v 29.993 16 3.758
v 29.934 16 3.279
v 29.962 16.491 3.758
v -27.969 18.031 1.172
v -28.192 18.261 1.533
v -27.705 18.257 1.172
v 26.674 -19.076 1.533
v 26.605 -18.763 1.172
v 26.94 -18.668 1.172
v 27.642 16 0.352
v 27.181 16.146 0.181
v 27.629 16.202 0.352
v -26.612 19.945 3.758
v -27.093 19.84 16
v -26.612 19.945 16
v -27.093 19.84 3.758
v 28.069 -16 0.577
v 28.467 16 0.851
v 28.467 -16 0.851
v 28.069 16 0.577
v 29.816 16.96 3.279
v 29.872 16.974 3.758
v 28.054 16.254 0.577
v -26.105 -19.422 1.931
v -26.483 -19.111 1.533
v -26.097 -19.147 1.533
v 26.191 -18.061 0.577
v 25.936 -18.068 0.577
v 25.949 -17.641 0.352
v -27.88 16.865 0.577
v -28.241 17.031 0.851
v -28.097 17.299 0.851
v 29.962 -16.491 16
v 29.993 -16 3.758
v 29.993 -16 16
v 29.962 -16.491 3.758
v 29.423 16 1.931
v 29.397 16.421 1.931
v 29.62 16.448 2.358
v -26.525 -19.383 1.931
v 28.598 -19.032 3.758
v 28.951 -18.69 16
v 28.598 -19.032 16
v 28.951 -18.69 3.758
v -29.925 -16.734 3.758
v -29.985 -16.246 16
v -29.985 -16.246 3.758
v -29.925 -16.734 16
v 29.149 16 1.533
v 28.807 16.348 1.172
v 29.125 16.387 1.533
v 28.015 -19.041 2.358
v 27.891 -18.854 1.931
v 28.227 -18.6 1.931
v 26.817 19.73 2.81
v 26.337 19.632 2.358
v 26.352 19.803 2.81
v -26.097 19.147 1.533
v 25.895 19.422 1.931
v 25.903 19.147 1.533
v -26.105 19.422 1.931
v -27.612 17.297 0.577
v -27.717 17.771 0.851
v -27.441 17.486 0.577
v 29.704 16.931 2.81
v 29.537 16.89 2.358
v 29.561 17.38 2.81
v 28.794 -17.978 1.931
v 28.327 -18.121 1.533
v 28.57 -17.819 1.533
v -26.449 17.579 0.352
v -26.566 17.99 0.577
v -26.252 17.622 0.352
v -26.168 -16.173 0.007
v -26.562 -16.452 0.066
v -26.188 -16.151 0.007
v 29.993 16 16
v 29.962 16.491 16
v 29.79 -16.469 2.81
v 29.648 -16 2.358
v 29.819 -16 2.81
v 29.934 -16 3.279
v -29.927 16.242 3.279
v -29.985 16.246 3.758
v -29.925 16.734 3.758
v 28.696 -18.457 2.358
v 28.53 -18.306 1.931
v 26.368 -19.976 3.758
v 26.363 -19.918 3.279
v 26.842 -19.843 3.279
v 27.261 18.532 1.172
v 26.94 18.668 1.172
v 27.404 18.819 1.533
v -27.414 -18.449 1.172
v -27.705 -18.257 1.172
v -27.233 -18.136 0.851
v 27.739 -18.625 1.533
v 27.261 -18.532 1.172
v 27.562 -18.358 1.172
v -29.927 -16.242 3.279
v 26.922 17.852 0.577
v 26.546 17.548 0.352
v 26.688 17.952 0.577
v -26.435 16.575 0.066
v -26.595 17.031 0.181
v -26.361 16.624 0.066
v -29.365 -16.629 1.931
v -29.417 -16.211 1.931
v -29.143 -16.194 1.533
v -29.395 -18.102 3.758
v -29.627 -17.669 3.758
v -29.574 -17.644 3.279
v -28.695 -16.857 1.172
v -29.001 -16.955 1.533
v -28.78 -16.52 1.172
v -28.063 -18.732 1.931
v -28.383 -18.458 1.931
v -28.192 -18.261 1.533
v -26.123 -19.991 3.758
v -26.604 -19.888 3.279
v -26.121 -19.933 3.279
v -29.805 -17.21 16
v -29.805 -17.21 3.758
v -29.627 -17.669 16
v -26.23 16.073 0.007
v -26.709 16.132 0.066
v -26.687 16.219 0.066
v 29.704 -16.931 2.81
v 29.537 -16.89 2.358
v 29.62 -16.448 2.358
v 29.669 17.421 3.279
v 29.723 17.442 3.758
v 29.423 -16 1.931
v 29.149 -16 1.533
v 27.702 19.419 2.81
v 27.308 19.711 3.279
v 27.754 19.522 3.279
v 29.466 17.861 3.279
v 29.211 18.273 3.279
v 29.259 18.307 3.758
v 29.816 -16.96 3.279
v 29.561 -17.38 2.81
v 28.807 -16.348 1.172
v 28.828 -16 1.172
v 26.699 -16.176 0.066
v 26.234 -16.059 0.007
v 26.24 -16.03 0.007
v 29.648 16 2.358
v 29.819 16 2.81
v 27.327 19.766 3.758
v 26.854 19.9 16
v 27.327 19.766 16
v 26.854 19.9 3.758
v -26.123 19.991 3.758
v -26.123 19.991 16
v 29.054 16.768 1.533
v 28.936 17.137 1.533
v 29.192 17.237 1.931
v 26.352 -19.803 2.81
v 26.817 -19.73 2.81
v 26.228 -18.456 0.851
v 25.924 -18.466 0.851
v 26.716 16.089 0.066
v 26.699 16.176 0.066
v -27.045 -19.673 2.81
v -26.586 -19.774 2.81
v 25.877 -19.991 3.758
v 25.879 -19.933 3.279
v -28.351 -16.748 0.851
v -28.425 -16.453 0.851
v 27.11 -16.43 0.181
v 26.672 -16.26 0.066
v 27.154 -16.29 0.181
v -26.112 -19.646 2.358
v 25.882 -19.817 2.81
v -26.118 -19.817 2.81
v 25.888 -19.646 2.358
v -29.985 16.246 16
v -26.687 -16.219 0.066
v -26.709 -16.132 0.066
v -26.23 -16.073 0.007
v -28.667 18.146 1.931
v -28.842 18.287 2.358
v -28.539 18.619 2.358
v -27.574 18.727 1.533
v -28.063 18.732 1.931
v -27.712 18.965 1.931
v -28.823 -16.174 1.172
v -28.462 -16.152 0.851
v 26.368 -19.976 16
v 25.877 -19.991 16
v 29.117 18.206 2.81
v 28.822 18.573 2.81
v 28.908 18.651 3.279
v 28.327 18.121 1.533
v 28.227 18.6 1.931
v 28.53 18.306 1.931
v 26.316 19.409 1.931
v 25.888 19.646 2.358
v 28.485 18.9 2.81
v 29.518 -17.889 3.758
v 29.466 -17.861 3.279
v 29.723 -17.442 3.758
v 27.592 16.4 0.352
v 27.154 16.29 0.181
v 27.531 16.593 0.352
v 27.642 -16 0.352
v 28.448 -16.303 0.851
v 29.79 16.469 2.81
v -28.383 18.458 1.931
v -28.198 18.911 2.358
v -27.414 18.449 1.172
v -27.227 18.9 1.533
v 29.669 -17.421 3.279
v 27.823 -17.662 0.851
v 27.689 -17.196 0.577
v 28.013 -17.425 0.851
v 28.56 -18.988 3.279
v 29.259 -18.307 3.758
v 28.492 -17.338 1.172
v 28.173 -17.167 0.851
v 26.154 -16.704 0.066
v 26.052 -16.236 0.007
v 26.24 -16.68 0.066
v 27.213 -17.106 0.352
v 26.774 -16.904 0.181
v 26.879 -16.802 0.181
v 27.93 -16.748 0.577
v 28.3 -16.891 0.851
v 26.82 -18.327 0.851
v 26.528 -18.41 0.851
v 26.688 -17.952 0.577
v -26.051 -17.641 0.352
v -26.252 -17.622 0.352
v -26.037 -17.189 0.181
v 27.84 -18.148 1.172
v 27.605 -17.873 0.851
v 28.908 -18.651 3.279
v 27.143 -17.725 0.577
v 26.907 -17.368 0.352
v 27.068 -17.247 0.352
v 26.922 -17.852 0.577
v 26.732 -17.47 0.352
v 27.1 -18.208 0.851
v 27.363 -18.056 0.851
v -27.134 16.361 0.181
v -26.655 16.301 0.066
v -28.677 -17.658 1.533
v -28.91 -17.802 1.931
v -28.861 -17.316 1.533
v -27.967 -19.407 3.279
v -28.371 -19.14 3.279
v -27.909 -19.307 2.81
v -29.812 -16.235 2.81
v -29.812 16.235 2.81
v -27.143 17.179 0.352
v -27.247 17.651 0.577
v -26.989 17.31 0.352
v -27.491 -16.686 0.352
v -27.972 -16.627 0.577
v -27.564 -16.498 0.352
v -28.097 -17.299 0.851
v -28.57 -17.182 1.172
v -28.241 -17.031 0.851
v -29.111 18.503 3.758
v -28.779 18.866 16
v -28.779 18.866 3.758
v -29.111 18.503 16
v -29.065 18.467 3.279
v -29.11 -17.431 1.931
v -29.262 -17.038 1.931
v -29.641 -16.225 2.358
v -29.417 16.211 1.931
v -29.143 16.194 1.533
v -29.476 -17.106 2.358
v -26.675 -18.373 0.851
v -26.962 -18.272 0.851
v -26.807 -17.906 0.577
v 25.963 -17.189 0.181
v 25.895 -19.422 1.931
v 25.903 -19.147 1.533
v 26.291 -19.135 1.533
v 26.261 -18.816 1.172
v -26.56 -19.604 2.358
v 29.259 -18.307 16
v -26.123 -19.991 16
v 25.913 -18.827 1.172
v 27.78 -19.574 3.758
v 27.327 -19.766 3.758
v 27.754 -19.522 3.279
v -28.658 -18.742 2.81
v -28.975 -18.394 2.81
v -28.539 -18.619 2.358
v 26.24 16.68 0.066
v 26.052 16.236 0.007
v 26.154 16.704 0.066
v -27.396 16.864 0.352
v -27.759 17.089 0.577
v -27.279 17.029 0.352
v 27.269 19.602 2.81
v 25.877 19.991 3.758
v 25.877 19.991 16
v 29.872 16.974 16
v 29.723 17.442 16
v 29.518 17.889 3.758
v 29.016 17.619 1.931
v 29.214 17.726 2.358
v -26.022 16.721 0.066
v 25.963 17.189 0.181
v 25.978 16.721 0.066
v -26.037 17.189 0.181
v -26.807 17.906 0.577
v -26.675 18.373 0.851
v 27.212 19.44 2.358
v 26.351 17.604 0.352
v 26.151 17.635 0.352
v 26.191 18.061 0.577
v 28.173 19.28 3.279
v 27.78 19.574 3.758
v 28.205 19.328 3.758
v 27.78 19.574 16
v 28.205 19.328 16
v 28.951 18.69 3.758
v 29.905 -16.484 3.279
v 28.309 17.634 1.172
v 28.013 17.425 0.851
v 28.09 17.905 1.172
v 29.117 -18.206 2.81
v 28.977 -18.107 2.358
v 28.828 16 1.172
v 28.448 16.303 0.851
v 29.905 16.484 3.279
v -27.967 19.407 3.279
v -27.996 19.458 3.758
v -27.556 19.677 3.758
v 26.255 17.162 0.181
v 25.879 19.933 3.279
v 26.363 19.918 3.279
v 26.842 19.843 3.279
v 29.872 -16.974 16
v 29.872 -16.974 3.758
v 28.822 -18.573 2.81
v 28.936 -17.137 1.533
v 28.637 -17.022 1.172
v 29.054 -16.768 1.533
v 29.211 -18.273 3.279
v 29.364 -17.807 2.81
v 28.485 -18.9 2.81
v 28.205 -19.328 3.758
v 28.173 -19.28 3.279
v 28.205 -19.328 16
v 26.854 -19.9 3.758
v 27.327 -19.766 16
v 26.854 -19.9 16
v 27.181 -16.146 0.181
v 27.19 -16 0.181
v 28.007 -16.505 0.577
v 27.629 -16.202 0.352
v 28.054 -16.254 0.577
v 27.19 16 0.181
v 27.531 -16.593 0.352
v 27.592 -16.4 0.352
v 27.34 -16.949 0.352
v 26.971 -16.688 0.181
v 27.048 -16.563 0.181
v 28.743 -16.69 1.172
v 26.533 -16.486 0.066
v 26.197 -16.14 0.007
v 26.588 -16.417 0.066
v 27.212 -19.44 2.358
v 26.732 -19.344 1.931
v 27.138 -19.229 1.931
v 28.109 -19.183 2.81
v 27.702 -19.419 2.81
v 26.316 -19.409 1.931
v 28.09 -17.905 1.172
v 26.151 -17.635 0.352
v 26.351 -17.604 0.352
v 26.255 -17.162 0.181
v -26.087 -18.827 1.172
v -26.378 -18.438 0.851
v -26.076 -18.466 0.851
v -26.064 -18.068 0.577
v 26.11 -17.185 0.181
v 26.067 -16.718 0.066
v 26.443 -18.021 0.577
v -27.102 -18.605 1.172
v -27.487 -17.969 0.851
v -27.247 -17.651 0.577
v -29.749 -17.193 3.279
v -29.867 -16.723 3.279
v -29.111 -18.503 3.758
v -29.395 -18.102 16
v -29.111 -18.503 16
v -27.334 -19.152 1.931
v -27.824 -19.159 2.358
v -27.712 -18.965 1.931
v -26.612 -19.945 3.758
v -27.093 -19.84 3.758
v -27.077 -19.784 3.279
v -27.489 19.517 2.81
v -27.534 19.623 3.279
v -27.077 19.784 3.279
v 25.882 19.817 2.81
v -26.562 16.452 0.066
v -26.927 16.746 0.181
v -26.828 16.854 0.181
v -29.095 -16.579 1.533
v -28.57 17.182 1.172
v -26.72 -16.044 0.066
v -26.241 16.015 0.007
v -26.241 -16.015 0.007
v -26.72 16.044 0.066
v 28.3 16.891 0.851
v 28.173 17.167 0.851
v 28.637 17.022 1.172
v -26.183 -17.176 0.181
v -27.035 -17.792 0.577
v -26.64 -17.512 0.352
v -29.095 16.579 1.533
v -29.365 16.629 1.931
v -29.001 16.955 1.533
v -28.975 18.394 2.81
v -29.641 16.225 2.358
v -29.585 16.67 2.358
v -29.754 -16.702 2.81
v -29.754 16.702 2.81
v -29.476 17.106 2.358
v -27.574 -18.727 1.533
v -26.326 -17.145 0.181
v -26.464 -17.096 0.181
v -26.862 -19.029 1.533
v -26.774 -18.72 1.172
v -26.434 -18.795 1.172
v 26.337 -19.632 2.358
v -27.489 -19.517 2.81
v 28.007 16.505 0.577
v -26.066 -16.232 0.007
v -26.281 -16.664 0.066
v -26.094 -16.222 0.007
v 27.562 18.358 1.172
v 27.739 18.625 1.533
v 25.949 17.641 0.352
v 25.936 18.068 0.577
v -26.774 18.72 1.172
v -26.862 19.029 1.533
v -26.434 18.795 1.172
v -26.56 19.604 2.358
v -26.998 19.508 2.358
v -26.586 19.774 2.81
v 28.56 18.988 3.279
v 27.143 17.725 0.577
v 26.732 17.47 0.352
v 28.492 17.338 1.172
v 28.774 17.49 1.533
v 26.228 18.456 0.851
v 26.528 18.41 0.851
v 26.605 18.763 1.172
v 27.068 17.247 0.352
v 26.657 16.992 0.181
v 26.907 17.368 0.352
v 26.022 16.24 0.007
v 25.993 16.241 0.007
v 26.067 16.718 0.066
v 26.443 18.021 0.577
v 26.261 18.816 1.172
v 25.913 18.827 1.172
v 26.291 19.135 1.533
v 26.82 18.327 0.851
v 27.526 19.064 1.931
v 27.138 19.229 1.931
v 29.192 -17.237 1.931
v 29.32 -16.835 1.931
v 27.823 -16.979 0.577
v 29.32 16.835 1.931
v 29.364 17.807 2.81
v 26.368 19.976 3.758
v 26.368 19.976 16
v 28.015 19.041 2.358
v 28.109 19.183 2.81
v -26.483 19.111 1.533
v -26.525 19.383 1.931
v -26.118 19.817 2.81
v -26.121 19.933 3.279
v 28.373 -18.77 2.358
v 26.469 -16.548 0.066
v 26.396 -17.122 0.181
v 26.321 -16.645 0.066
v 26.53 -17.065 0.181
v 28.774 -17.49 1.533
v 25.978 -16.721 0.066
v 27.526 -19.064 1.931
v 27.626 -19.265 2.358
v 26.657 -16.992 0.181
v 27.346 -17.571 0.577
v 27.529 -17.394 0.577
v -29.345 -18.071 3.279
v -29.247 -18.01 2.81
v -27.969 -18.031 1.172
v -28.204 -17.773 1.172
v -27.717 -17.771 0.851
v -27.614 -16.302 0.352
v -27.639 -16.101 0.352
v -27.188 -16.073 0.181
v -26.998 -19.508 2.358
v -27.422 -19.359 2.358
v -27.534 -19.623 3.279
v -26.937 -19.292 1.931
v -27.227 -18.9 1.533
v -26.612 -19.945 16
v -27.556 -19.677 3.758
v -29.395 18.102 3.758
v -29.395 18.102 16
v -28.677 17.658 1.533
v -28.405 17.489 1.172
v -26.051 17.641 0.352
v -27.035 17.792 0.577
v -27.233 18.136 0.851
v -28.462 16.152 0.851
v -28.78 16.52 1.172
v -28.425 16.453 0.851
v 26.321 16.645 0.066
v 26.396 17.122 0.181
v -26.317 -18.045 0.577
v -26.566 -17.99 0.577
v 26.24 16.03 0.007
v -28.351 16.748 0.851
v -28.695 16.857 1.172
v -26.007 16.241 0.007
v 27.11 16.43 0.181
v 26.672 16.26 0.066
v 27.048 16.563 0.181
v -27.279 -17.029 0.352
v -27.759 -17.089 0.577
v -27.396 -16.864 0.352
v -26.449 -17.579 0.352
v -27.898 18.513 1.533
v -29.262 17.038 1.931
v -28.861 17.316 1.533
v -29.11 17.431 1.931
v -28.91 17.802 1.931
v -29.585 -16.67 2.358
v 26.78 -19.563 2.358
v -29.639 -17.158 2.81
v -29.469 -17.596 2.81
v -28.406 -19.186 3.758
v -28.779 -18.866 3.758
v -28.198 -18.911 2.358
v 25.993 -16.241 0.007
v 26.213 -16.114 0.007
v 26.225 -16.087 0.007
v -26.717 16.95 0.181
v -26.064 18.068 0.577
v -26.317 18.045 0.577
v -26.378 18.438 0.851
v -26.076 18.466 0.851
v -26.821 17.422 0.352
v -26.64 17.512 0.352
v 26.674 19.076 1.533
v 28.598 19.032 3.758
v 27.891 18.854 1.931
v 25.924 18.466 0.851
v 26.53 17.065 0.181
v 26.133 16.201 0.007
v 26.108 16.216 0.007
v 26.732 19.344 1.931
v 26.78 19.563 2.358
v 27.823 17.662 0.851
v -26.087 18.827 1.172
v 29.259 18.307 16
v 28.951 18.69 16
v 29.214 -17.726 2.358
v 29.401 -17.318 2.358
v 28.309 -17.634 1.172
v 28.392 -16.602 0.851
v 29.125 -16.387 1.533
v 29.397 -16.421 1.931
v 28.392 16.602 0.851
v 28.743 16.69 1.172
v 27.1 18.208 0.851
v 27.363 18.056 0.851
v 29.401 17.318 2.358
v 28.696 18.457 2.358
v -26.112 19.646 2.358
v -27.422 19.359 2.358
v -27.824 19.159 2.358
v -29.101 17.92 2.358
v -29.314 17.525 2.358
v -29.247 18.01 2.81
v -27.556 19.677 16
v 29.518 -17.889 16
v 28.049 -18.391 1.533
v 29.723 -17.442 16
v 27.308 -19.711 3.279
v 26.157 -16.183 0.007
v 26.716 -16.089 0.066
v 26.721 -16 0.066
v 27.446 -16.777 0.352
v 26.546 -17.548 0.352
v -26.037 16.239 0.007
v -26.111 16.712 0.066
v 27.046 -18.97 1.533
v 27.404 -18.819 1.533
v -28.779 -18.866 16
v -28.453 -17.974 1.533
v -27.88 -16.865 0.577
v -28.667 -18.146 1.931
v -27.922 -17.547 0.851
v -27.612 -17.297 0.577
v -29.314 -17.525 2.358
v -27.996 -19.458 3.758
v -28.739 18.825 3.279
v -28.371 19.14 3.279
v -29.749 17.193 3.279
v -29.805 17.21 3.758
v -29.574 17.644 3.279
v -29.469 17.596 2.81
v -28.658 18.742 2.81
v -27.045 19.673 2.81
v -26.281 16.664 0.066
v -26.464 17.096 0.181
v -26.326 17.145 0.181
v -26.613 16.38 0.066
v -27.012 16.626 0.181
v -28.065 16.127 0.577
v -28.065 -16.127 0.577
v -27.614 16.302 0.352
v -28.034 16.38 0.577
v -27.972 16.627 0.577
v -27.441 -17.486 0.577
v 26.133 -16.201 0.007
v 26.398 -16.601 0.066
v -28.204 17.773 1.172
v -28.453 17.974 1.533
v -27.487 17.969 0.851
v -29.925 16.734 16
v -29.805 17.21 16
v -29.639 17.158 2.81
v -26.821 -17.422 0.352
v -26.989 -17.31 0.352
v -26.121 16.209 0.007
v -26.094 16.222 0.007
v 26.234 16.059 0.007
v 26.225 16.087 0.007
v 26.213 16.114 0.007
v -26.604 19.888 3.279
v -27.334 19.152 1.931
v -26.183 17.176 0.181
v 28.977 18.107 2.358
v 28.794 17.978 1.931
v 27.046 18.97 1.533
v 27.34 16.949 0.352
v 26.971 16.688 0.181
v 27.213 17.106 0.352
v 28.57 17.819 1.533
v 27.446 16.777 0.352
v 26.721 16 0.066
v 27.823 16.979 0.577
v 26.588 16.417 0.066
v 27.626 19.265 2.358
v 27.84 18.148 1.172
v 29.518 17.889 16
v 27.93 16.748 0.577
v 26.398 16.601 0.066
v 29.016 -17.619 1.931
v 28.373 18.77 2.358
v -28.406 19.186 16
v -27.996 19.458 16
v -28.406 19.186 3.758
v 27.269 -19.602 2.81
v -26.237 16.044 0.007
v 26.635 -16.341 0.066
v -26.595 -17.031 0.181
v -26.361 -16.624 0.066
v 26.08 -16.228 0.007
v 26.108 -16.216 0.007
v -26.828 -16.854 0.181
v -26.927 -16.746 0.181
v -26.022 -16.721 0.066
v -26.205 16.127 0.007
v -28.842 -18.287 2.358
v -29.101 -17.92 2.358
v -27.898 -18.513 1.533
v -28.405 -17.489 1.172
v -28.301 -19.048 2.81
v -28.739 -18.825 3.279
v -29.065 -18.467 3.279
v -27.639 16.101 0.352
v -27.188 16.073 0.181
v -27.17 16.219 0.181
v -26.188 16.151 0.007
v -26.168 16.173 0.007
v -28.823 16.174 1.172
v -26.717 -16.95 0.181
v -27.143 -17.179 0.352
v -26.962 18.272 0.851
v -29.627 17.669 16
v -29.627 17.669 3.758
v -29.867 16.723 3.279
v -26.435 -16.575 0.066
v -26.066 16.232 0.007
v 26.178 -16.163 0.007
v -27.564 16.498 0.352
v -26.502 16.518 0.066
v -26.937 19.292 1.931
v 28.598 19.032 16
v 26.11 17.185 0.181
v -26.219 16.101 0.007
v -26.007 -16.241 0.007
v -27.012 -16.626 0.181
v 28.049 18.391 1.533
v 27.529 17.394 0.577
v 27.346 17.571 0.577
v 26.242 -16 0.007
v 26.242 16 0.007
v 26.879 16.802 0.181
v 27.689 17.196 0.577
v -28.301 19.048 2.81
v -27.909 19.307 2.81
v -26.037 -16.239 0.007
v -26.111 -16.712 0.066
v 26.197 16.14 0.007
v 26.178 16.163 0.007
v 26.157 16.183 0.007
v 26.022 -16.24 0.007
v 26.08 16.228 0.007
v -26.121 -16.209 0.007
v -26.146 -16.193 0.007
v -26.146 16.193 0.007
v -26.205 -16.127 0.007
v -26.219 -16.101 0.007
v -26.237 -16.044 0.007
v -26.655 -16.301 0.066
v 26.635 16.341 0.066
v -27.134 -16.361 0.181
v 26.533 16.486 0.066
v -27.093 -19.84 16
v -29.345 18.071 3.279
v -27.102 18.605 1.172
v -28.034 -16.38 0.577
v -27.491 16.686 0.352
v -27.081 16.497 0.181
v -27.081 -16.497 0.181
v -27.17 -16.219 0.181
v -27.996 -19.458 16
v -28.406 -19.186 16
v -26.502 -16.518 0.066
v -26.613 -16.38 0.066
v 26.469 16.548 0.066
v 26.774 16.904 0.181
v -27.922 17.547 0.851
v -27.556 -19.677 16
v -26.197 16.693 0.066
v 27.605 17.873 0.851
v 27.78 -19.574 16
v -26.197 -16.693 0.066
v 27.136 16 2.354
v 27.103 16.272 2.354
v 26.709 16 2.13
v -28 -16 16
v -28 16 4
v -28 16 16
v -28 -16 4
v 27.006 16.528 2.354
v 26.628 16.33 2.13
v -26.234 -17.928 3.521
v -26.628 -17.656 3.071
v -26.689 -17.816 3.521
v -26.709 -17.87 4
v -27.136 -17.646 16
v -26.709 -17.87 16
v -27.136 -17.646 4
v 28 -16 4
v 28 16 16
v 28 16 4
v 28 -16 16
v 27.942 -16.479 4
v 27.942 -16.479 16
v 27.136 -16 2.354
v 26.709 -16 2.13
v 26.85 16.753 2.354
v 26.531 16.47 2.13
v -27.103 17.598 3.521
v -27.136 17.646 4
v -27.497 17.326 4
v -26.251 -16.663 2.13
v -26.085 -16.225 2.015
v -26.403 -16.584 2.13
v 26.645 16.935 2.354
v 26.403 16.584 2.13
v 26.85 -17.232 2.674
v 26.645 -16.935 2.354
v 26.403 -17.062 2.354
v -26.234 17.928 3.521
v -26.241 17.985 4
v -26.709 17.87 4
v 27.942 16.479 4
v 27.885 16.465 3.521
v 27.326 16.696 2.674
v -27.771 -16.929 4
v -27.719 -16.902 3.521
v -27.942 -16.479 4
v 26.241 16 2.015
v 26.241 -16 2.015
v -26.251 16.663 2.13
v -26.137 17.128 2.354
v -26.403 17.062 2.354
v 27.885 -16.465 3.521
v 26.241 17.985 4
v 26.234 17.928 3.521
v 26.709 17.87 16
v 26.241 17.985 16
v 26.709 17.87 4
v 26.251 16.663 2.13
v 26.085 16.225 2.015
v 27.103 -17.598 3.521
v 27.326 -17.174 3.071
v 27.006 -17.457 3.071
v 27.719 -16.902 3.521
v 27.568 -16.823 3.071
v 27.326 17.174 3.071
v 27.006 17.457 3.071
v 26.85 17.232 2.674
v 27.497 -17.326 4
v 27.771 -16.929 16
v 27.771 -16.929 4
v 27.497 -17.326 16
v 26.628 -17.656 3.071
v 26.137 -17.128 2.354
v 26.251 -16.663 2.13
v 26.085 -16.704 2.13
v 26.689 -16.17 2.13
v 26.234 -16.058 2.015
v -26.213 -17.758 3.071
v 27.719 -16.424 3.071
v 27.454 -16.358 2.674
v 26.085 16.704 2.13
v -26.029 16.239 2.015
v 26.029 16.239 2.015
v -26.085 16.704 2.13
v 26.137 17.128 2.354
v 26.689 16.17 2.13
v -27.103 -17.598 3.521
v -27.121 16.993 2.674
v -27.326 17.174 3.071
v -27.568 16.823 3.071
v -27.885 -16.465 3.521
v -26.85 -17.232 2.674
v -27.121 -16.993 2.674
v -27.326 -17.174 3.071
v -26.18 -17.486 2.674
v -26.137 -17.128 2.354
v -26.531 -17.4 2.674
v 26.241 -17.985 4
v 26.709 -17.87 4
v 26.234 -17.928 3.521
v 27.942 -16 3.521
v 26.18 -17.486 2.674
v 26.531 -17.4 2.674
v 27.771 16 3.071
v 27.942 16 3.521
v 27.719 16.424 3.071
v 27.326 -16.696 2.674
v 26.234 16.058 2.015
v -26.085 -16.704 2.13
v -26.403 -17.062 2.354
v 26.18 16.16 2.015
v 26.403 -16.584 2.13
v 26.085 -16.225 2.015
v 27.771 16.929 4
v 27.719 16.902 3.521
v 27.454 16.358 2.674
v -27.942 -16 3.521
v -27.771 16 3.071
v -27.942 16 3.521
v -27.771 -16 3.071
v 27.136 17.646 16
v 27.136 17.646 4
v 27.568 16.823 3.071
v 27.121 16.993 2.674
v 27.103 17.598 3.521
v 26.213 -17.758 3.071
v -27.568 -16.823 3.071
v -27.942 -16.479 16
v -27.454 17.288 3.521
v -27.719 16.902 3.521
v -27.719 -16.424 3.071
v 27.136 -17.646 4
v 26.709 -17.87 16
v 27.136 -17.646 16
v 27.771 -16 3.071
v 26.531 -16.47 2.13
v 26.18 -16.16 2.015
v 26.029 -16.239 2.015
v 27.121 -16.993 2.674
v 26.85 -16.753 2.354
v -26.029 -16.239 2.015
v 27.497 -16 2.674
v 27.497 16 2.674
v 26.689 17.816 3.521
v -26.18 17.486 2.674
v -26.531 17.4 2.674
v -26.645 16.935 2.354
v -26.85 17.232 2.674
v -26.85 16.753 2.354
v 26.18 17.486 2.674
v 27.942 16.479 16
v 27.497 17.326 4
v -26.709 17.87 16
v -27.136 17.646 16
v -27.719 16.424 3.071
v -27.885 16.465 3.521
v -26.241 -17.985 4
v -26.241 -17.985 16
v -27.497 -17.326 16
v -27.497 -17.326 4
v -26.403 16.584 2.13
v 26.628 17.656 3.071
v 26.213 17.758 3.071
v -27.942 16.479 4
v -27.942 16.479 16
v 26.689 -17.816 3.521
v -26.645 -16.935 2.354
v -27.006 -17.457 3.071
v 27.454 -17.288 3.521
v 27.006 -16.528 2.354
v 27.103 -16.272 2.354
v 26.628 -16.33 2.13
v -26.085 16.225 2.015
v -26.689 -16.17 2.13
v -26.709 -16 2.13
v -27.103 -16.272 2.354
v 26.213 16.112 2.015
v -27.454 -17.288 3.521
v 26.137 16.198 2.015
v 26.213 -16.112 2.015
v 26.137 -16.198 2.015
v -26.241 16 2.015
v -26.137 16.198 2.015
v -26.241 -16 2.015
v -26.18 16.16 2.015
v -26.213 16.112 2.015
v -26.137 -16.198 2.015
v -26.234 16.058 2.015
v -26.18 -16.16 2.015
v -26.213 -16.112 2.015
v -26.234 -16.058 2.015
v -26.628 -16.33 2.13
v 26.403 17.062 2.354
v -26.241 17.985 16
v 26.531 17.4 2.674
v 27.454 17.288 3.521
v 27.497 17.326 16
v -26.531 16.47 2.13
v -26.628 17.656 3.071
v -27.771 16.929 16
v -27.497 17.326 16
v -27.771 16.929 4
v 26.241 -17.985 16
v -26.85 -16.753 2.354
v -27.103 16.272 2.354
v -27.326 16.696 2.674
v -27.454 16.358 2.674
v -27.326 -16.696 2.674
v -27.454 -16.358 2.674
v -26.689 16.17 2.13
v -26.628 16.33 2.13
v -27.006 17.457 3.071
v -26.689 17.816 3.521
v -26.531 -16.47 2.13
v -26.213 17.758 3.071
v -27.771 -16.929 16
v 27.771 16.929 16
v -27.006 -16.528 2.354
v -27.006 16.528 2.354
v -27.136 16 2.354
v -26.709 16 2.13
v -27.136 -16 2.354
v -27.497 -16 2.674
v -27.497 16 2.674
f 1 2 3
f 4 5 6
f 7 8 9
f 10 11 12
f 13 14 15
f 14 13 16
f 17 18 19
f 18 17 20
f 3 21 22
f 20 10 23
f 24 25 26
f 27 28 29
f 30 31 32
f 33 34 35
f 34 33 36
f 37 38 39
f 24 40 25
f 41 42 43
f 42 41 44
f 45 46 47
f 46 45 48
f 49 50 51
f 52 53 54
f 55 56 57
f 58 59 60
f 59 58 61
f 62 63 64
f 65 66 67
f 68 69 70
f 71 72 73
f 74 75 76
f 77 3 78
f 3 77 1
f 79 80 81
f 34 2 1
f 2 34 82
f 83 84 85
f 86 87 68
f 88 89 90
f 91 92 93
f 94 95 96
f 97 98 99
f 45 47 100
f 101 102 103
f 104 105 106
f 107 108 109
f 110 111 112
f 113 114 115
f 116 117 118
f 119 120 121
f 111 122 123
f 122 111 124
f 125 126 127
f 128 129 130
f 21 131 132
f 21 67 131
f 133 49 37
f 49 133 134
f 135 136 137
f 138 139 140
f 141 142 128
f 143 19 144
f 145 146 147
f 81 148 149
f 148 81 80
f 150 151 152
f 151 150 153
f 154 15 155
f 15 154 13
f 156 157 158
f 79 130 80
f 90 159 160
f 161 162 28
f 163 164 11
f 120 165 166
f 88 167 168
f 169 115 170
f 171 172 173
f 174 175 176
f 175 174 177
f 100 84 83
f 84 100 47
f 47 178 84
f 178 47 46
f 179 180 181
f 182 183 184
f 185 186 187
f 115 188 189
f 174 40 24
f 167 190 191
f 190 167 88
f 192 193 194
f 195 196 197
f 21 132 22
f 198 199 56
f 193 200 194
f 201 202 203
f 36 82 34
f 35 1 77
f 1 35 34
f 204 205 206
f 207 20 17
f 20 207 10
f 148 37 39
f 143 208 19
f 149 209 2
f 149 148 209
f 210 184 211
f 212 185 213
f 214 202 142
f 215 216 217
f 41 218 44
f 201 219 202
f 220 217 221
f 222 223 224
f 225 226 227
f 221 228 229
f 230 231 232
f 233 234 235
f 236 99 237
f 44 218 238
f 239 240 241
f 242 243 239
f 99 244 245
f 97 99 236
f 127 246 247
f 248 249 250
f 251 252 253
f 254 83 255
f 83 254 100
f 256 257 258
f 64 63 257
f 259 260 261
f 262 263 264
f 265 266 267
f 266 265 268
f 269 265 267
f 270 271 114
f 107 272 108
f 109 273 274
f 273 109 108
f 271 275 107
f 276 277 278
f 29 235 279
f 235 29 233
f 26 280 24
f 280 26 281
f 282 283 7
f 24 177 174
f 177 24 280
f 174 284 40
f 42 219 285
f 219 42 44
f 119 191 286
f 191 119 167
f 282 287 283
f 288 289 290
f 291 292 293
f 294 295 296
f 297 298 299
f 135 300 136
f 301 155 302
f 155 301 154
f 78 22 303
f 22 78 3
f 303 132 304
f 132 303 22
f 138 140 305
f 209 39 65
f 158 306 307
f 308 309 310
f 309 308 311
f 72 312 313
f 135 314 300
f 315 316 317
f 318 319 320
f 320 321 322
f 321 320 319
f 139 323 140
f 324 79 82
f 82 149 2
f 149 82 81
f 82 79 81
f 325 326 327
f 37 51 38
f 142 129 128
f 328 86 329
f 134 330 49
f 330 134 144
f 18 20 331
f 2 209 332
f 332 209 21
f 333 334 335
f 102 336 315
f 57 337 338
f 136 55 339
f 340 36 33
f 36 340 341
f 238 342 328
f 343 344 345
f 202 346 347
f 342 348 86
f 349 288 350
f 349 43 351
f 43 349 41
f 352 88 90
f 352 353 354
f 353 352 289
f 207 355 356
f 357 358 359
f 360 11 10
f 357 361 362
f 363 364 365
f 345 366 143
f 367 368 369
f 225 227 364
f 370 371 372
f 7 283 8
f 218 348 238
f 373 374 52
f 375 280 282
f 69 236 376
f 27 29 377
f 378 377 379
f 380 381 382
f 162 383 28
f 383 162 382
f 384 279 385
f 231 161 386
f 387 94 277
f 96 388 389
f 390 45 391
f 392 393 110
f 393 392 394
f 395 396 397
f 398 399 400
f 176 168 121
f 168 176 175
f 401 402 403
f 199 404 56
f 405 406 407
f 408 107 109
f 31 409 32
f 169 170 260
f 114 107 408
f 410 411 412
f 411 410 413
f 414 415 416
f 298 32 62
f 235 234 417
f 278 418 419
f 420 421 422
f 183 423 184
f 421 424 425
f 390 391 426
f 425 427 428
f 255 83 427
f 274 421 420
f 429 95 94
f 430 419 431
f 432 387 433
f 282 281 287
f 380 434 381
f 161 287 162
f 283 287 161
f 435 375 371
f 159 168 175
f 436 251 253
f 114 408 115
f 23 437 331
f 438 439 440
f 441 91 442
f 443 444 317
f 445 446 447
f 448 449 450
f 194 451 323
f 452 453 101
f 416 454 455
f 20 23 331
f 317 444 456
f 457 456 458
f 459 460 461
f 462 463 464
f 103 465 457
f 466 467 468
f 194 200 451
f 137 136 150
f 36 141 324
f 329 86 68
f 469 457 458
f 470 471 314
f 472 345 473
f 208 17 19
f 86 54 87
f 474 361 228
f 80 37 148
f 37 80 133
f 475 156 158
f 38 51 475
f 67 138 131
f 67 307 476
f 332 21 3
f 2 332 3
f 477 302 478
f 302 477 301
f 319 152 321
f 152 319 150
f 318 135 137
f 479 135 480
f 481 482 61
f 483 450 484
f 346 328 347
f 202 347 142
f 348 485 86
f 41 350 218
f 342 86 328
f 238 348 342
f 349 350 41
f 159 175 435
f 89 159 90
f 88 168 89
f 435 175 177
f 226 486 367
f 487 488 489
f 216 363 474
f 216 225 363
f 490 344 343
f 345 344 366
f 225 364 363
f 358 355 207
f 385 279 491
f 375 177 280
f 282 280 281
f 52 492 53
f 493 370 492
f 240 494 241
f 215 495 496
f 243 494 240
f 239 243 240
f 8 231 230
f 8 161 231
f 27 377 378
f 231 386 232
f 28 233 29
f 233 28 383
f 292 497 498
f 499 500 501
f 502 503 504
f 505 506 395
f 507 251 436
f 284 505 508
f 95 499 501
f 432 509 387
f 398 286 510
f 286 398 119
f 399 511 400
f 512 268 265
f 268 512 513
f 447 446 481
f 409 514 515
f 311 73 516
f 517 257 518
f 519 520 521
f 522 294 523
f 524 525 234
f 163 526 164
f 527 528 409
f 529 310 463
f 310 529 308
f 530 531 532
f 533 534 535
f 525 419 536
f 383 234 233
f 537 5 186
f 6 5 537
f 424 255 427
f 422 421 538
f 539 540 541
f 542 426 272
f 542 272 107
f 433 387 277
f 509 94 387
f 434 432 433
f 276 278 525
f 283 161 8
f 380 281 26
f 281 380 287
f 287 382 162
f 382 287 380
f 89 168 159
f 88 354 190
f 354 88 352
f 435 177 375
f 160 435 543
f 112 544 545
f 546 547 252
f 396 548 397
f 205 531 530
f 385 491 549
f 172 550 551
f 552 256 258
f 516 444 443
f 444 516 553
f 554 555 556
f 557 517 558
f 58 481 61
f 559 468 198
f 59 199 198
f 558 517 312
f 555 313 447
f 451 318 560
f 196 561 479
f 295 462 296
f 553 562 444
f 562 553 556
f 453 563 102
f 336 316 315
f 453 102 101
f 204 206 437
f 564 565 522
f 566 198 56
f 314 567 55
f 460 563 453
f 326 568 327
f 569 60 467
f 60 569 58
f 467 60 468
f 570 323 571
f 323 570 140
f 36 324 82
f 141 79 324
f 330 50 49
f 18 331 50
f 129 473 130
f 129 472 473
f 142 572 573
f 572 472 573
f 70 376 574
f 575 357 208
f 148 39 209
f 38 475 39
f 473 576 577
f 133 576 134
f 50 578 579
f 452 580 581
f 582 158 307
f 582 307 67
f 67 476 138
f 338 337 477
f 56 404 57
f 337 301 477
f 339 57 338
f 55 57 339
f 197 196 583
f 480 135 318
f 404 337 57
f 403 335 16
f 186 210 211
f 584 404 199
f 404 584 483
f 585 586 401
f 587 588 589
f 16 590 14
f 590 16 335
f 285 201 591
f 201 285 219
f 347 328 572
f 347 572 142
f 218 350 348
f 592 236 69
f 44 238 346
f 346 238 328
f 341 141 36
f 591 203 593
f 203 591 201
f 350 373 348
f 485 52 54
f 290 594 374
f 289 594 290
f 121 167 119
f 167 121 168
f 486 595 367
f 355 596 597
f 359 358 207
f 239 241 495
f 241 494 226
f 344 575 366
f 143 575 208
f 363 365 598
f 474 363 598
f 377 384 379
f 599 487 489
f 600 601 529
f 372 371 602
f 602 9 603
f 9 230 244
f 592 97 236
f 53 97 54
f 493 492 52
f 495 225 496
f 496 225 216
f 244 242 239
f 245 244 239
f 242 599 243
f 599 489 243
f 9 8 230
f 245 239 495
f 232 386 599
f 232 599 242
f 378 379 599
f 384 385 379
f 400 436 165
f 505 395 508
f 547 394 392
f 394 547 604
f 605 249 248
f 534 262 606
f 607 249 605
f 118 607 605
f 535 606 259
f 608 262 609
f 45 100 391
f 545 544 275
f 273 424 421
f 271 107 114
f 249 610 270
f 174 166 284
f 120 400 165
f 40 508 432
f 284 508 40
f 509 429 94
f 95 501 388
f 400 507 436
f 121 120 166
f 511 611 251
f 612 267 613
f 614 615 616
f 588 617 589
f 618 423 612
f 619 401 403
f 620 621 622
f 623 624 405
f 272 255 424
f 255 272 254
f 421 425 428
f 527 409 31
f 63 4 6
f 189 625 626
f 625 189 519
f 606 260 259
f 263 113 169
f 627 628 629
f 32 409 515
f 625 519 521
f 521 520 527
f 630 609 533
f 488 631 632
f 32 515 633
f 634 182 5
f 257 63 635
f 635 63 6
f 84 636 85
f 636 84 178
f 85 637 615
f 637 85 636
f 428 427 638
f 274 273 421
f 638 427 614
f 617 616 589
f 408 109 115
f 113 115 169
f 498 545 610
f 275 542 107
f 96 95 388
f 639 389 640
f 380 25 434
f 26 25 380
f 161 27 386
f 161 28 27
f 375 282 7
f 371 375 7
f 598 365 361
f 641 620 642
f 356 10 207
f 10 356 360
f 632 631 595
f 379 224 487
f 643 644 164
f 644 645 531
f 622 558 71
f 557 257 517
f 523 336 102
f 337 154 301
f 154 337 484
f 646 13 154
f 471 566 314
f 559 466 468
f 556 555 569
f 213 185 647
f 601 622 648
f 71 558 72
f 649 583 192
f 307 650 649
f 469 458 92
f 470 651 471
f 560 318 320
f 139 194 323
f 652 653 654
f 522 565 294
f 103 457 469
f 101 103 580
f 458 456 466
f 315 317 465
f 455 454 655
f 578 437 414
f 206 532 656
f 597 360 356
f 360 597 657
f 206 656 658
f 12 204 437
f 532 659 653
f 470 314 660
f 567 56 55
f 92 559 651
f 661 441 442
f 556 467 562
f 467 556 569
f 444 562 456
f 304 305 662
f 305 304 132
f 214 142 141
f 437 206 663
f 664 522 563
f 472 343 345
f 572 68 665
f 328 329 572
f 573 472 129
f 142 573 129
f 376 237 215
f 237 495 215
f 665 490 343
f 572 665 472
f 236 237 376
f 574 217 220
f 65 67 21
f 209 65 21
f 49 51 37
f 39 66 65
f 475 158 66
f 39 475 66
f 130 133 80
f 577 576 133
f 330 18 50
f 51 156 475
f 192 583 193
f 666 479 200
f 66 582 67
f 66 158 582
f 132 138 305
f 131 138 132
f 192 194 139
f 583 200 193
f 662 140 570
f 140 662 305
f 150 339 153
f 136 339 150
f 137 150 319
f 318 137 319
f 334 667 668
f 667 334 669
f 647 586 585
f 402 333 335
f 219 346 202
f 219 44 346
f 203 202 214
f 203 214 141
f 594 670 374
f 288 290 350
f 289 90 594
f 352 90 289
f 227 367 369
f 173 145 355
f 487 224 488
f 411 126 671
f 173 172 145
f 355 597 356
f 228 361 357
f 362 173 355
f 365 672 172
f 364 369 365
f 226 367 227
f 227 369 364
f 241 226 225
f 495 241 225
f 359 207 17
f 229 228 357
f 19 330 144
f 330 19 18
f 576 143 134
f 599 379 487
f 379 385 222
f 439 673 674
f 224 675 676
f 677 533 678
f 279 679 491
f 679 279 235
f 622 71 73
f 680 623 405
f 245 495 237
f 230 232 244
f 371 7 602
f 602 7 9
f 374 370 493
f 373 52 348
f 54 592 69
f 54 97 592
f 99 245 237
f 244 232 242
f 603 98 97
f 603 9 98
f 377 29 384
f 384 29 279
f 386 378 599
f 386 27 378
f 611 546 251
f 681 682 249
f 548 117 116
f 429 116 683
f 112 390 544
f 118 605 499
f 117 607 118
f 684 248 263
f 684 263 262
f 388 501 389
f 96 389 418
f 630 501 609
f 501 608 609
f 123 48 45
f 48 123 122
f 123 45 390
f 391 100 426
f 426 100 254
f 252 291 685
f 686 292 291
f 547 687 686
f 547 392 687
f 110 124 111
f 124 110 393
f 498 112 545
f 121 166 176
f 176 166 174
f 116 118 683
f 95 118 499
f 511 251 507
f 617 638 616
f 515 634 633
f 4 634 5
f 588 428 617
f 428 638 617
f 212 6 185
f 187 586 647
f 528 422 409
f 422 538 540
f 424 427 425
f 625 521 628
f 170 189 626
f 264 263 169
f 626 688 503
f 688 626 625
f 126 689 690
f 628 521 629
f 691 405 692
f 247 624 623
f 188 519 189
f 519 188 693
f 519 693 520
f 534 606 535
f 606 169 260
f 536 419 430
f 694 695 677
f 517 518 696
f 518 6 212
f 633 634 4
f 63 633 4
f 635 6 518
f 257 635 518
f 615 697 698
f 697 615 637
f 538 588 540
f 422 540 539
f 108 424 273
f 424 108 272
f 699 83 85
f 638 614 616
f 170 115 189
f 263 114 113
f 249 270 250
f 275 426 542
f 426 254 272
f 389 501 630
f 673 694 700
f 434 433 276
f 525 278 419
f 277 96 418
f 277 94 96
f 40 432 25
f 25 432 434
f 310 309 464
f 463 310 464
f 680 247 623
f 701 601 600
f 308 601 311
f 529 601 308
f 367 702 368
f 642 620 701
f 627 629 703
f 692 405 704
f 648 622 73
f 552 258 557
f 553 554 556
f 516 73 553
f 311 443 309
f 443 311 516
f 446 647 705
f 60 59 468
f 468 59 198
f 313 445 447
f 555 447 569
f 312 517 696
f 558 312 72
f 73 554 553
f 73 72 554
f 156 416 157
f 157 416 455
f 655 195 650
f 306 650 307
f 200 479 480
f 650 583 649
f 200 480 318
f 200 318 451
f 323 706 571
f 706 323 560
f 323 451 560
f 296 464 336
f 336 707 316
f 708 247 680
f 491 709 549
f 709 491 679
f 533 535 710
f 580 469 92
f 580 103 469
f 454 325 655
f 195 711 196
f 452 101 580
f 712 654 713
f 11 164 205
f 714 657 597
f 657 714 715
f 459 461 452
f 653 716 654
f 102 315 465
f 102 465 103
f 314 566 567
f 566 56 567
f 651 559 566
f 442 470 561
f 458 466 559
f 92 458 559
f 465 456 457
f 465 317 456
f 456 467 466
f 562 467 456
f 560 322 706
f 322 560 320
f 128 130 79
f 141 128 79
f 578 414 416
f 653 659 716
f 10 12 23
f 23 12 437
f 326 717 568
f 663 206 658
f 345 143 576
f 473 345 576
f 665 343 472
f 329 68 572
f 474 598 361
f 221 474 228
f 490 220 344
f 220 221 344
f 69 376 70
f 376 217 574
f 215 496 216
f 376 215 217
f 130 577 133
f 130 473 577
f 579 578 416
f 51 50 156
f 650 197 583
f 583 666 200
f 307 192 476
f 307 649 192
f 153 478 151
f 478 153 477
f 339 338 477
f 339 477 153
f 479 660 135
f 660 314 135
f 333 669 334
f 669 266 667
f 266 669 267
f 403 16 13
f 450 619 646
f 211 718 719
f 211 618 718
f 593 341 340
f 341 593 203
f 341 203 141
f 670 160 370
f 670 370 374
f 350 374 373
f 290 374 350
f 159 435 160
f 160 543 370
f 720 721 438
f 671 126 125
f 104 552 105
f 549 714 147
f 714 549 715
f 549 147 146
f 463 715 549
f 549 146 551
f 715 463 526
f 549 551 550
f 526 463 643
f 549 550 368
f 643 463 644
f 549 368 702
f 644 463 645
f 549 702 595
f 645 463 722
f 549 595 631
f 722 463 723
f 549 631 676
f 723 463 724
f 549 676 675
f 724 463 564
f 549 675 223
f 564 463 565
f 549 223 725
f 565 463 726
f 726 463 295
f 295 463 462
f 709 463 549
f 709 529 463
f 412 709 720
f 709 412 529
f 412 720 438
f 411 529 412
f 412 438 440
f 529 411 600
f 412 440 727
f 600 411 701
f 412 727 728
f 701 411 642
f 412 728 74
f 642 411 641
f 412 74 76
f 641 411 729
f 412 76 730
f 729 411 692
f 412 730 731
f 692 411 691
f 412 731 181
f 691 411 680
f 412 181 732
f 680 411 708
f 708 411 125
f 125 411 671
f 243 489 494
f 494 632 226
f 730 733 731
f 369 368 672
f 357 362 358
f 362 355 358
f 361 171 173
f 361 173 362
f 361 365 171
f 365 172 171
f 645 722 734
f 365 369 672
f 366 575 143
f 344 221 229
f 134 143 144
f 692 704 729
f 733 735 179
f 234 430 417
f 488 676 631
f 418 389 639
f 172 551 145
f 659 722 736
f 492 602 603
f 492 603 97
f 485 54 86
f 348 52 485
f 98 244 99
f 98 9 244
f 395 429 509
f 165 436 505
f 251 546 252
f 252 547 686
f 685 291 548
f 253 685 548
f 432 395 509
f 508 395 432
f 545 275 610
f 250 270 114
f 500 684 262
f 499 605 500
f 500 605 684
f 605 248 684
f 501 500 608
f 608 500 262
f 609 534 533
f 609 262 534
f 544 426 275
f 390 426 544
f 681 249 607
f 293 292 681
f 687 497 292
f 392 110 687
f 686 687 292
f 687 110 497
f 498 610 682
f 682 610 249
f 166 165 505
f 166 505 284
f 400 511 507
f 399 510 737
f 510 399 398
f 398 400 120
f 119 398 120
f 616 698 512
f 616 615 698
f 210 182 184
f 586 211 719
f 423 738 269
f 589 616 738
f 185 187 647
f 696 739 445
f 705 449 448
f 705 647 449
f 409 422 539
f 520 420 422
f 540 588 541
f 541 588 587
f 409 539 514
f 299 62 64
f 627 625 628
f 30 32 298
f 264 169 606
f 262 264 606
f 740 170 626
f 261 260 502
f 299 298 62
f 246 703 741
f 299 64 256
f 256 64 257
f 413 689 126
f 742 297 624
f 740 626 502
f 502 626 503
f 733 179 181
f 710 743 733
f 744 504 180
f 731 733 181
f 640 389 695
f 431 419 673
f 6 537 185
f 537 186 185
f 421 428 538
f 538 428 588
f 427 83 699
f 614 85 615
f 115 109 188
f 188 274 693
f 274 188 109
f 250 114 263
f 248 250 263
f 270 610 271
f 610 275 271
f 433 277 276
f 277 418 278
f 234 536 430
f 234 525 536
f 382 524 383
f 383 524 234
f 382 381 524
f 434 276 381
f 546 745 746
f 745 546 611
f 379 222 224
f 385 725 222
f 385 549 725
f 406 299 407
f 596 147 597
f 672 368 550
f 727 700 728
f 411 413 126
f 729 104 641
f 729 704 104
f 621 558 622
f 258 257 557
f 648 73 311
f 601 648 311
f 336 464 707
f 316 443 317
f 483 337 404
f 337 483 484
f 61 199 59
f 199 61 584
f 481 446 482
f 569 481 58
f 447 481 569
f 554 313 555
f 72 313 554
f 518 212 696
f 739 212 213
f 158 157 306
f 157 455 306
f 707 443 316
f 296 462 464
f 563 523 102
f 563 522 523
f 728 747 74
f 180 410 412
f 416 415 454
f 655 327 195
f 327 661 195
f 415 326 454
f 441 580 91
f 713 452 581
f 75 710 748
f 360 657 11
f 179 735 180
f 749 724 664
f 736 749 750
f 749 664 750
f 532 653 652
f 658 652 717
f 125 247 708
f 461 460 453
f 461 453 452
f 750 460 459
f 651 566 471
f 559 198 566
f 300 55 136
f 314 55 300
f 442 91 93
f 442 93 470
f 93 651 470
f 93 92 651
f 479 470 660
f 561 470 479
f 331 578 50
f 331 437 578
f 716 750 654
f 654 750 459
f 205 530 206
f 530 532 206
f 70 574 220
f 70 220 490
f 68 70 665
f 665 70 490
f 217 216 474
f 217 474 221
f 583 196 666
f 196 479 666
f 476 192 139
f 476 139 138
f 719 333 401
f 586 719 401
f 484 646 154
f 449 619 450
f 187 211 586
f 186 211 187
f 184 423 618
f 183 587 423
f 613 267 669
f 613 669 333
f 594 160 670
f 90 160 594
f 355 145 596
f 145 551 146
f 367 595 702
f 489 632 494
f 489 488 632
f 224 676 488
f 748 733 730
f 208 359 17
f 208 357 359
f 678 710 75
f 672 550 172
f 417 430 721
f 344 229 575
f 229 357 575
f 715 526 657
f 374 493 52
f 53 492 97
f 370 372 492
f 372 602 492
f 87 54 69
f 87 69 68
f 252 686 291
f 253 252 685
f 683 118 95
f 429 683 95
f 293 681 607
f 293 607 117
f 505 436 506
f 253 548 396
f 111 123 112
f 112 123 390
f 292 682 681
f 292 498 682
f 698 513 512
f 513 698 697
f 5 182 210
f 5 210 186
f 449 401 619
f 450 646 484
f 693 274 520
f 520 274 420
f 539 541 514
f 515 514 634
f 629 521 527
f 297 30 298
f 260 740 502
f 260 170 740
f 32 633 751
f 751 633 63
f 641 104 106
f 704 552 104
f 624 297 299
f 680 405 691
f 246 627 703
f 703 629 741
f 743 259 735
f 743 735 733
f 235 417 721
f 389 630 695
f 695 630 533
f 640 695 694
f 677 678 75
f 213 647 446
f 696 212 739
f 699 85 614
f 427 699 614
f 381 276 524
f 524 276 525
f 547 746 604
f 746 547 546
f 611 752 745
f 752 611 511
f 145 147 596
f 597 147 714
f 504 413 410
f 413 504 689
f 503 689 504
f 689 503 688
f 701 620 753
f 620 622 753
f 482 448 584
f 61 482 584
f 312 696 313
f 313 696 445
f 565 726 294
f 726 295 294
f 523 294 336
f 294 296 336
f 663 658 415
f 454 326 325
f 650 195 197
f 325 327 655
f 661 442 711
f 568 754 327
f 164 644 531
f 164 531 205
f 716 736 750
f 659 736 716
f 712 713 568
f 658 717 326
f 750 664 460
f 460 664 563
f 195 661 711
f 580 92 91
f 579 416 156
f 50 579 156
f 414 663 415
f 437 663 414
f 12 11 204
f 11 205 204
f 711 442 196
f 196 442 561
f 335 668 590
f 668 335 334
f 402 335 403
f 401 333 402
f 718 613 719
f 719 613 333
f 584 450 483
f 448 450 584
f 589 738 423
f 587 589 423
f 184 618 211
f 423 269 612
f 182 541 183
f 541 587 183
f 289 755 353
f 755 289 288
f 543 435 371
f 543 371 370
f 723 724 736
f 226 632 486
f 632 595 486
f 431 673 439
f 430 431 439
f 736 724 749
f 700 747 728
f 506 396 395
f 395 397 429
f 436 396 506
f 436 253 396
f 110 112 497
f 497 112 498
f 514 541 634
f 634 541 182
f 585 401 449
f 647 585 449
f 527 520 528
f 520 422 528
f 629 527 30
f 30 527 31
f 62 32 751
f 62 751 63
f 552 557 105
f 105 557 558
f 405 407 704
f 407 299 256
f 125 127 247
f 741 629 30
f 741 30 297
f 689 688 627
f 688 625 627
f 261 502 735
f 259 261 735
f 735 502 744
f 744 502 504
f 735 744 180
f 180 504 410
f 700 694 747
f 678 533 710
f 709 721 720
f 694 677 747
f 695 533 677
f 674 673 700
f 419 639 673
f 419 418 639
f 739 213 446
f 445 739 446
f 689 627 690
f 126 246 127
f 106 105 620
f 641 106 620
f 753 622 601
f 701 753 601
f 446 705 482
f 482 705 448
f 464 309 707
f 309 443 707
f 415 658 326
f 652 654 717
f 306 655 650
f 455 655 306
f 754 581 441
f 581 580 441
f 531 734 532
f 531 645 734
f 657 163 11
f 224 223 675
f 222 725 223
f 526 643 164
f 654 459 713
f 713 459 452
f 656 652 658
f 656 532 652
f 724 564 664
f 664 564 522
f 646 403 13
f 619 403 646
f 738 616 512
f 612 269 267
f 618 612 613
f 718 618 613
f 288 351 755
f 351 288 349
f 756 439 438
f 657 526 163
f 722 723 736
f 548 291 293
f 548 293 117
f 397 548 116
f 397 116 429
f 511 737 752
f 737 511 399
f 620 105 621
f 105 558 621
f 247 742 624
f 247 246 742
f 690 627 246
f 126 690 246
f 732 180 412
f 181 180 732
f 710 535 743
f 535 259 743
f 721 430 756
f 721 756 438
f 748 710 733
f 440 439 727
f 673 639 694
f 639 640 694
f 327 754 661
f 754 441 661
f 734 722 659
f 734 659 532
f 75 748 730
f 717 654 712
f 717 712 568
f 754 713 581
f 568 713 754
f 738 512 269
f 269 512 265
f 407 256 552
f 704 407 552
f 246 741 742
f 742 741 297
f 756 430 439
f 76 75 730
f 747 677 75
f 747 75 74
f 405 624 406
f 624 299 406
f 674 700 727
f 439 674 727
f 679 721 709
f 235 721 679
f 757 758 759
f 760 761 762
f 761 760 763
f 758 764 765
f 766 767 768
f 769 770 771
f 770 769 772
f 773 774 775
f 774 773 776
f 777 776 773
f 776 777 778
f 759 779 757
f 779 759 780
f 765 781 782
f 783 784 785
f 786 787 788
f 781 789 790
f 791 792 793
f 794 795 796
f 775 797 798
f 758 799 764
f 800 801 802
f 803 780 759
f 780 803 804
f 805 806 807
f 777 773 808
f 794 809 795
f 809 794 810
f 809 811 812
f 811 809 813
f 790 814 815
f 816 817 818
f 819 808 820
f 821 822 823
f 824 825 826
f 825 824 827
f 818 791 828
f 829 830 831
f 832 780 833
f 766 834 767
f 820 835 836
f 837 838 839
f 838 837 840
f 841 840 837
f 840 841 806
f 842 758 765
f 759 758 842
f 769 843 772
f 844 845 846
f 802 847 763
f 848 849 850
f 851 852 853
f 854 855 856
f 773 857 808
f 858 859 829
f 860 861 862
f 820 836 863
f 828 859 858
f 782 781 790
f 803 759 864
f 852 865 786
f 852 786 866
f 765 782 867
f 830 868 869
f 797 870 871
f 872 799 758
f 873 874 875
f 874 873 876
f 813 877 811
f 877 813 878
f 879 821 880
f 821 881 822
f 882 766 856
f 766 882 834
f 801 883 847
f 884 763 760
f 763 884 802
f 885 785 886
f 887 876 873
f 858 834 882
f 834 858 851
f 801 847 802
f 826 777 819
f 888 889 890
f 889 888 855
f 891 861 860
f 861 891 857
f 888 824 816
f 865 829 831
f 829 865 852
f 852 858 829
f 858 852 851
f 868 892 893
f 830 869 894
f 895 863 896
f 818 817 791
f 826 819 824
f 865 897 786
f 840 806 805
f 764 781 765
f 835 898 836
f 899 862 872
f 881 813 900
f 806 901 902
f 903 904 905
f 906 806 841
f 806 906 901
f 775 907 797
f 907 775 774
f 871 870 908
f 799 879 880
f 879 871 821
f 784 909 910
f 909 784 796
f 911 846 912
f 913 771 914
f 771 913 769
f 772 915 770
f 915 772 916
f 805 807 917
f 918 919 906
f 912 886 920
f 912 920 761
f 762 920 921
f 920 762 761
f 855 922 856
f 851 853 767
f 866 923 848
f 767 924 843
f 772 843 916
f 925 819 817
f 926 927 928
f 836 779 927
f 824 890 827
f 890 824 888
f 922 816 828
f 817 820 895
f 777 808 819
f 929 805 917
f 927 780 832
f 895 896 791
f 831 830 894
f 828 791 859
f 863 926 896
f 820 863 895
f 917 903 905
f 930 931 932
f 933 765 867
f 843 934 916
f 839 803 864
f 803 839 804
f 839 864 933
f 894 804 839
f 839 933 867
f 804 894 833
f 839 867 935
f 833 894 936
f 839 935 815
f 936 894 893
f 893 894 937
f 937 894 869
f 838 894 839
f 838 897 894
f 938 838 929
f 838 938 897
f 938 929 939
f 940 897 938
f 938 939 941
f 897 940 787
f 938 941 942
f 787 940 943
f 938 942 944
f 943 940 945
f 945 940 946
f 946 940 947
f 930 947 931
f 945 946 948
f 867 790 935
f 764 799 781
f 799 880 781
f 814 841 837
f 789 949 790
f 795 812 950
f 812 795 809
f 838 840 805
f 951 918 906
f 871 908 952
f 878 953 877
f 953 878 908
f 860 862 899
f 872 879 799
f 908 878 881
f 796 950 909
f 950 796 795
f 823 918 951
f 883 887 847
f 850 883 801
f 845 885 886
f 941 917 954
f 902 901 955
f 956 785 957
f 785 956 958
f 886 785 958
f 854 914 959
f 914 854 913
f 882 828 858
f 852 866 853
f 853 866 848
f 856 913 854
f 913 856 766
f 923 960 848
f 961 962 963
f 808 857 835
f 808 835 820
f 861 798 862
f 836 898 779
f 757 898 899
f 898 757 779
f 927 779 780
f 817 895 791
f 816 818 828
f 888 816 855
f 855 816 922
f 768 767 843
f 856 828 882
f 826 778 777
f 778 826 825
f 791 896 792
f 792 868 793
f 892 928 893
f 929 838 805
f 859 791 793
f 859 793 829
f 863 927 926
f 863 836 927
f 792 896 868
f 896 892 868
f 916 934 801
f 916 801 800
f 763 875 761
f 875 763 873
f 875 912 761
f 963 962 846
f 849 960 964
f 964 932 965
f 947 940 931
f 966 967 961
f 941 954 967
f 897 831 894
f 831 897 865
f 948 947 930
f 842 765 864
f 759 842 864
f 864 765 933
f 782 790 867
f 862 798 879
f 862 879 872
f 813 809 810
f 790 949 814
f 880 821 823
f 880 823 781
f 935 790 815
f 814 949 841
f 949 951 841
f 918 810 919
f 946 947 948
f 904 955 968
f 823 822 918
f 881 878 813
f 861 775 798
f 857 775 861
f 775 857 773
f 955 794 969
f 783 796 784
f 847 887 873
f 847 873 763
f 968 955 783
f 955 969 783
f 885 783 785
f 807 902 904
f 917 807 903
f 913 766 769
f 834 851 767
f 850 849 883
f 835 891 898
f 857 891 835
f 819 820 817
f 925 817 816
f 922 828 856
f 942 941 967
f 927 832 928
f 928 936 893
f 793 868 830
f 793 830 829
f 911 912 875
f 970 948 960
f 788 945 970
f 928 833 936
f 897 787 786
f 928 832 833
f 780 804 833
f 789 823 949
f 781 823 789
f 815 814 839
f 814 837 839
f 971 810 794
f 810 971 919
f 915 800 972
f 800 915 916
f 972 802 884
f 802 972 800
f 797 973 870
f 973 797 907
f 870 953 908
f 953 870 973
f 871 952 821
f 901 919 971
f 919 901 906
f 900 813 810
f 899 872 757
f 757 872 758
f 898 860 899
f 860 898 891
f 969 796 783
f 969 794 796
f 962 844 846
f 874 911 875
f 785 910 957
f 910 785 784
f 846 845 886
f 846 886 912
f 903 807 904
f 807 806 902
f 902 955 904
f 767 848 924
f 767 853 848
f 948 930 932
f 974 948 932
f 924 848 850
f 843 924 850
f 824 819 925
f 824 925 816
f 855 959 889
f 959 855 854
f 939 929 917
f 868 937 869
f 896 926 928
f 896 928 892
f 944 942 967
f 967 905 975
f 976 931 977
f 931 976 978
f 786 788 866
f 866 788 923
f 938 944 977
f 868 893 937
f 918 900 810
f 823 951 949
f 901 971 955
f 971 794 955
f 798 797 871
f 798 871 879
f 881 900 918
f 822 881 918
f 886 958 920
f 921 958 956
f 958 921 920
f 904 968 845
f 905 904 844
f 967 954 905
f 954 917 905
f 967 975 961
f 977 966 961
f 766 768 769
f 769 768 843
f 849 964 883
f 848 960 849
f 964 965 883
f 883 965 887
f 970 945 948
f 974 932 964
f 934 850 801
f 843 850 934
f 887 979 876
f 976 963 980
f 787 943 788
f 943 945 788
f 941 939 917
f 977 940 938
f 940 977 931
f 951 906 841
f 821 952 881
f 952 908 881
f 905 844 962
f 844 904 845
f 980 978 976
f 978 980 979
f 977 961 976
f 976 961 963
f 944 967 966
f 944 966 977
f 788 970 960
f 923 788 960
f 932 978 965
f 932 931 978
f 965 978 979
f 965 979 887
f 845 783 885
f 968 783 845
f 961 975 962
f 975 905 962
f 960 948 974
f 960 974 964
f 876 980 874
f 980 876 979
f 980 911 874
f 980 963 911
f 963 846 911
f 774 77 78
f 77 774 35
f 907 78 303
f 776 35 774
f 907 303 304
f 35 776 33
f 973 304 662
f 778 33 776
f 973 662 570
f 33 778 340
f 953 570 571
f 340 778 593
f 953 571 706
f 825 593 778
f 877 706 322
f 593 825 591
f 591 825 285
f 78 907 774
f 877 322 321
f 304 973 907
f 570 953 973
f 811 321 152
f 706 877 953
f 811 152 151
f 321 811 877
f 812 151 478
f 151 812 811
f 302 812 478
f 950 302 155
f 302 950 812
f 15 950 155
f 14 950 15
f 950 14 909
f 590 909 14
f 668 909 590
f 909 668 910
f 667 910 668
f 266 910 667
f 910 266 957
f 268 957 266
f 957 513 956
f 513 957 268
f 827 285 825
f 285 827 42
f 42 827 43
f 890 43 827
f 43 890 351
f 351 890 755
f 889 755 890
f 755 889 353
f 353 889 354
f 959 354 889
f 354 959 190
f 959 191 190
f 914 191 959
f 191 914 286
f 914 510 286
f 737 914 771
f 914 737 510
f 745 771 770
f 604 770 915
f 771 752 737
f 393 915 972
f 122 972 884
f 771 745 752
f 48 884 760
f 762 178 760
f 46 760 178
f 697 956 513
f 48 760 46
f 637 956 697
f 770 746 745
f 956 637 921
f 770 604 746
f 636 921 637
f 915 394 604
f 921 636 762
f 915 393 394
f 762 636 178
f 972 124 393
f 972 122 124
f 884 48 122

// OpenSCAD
// Minkowski Example
// A small storage tray with rounded edges.
//
// minkowski() traces the second shape over the surface of the first,
// so a box combined with a sphere becomes a box with rounded edges.
// The box is shrunk by the radius first so the final size stays exact.

$fa = 6;
$fs = 0.5;

size = [60, 40, 20]; // outside size of the tray
radius = 4;          // how round the outside edges are
wall = 2;            // wall and floor thickness

module rounded_box(size, radius) {
    minkowski() {
        cube(size - 2 * [radius, radius, radius], center = true);
        sphere(r = radius);
    }
}

// Sit the tray on the build plate
translate([0, 0, size.z / 2])
difference() {
    rounded_box(size, radius);

    // Hollow it out. The inner radius is smaller by the wall thickness,
    // which keeps the walls the same thickness around the corners.
    translate([0, 0, wall])
        rounded_box([size.x - 2 * wall, size.y - 2 * wall, size.z], radius - wall);

    // Cut the rounded top off to leave a flat rim
    translate([0, 0, size.z - radius])
        cube([size.x + 1, size.y + 1, size.z], center = true);
}


// Written by Arijit Aich, 2026

// To the extent possible under law, the author(s) have dedicated all
// copyright and related and neighboring rights to this software to the
// public domain worldwide. This software is distributed without any
// warranty.
//
// You should have received a copy of the CC0 Public Domain
// Dedication along with this software.
// If not, see <http://creativecommons.org/publicdomain/zero/1.0/>.
